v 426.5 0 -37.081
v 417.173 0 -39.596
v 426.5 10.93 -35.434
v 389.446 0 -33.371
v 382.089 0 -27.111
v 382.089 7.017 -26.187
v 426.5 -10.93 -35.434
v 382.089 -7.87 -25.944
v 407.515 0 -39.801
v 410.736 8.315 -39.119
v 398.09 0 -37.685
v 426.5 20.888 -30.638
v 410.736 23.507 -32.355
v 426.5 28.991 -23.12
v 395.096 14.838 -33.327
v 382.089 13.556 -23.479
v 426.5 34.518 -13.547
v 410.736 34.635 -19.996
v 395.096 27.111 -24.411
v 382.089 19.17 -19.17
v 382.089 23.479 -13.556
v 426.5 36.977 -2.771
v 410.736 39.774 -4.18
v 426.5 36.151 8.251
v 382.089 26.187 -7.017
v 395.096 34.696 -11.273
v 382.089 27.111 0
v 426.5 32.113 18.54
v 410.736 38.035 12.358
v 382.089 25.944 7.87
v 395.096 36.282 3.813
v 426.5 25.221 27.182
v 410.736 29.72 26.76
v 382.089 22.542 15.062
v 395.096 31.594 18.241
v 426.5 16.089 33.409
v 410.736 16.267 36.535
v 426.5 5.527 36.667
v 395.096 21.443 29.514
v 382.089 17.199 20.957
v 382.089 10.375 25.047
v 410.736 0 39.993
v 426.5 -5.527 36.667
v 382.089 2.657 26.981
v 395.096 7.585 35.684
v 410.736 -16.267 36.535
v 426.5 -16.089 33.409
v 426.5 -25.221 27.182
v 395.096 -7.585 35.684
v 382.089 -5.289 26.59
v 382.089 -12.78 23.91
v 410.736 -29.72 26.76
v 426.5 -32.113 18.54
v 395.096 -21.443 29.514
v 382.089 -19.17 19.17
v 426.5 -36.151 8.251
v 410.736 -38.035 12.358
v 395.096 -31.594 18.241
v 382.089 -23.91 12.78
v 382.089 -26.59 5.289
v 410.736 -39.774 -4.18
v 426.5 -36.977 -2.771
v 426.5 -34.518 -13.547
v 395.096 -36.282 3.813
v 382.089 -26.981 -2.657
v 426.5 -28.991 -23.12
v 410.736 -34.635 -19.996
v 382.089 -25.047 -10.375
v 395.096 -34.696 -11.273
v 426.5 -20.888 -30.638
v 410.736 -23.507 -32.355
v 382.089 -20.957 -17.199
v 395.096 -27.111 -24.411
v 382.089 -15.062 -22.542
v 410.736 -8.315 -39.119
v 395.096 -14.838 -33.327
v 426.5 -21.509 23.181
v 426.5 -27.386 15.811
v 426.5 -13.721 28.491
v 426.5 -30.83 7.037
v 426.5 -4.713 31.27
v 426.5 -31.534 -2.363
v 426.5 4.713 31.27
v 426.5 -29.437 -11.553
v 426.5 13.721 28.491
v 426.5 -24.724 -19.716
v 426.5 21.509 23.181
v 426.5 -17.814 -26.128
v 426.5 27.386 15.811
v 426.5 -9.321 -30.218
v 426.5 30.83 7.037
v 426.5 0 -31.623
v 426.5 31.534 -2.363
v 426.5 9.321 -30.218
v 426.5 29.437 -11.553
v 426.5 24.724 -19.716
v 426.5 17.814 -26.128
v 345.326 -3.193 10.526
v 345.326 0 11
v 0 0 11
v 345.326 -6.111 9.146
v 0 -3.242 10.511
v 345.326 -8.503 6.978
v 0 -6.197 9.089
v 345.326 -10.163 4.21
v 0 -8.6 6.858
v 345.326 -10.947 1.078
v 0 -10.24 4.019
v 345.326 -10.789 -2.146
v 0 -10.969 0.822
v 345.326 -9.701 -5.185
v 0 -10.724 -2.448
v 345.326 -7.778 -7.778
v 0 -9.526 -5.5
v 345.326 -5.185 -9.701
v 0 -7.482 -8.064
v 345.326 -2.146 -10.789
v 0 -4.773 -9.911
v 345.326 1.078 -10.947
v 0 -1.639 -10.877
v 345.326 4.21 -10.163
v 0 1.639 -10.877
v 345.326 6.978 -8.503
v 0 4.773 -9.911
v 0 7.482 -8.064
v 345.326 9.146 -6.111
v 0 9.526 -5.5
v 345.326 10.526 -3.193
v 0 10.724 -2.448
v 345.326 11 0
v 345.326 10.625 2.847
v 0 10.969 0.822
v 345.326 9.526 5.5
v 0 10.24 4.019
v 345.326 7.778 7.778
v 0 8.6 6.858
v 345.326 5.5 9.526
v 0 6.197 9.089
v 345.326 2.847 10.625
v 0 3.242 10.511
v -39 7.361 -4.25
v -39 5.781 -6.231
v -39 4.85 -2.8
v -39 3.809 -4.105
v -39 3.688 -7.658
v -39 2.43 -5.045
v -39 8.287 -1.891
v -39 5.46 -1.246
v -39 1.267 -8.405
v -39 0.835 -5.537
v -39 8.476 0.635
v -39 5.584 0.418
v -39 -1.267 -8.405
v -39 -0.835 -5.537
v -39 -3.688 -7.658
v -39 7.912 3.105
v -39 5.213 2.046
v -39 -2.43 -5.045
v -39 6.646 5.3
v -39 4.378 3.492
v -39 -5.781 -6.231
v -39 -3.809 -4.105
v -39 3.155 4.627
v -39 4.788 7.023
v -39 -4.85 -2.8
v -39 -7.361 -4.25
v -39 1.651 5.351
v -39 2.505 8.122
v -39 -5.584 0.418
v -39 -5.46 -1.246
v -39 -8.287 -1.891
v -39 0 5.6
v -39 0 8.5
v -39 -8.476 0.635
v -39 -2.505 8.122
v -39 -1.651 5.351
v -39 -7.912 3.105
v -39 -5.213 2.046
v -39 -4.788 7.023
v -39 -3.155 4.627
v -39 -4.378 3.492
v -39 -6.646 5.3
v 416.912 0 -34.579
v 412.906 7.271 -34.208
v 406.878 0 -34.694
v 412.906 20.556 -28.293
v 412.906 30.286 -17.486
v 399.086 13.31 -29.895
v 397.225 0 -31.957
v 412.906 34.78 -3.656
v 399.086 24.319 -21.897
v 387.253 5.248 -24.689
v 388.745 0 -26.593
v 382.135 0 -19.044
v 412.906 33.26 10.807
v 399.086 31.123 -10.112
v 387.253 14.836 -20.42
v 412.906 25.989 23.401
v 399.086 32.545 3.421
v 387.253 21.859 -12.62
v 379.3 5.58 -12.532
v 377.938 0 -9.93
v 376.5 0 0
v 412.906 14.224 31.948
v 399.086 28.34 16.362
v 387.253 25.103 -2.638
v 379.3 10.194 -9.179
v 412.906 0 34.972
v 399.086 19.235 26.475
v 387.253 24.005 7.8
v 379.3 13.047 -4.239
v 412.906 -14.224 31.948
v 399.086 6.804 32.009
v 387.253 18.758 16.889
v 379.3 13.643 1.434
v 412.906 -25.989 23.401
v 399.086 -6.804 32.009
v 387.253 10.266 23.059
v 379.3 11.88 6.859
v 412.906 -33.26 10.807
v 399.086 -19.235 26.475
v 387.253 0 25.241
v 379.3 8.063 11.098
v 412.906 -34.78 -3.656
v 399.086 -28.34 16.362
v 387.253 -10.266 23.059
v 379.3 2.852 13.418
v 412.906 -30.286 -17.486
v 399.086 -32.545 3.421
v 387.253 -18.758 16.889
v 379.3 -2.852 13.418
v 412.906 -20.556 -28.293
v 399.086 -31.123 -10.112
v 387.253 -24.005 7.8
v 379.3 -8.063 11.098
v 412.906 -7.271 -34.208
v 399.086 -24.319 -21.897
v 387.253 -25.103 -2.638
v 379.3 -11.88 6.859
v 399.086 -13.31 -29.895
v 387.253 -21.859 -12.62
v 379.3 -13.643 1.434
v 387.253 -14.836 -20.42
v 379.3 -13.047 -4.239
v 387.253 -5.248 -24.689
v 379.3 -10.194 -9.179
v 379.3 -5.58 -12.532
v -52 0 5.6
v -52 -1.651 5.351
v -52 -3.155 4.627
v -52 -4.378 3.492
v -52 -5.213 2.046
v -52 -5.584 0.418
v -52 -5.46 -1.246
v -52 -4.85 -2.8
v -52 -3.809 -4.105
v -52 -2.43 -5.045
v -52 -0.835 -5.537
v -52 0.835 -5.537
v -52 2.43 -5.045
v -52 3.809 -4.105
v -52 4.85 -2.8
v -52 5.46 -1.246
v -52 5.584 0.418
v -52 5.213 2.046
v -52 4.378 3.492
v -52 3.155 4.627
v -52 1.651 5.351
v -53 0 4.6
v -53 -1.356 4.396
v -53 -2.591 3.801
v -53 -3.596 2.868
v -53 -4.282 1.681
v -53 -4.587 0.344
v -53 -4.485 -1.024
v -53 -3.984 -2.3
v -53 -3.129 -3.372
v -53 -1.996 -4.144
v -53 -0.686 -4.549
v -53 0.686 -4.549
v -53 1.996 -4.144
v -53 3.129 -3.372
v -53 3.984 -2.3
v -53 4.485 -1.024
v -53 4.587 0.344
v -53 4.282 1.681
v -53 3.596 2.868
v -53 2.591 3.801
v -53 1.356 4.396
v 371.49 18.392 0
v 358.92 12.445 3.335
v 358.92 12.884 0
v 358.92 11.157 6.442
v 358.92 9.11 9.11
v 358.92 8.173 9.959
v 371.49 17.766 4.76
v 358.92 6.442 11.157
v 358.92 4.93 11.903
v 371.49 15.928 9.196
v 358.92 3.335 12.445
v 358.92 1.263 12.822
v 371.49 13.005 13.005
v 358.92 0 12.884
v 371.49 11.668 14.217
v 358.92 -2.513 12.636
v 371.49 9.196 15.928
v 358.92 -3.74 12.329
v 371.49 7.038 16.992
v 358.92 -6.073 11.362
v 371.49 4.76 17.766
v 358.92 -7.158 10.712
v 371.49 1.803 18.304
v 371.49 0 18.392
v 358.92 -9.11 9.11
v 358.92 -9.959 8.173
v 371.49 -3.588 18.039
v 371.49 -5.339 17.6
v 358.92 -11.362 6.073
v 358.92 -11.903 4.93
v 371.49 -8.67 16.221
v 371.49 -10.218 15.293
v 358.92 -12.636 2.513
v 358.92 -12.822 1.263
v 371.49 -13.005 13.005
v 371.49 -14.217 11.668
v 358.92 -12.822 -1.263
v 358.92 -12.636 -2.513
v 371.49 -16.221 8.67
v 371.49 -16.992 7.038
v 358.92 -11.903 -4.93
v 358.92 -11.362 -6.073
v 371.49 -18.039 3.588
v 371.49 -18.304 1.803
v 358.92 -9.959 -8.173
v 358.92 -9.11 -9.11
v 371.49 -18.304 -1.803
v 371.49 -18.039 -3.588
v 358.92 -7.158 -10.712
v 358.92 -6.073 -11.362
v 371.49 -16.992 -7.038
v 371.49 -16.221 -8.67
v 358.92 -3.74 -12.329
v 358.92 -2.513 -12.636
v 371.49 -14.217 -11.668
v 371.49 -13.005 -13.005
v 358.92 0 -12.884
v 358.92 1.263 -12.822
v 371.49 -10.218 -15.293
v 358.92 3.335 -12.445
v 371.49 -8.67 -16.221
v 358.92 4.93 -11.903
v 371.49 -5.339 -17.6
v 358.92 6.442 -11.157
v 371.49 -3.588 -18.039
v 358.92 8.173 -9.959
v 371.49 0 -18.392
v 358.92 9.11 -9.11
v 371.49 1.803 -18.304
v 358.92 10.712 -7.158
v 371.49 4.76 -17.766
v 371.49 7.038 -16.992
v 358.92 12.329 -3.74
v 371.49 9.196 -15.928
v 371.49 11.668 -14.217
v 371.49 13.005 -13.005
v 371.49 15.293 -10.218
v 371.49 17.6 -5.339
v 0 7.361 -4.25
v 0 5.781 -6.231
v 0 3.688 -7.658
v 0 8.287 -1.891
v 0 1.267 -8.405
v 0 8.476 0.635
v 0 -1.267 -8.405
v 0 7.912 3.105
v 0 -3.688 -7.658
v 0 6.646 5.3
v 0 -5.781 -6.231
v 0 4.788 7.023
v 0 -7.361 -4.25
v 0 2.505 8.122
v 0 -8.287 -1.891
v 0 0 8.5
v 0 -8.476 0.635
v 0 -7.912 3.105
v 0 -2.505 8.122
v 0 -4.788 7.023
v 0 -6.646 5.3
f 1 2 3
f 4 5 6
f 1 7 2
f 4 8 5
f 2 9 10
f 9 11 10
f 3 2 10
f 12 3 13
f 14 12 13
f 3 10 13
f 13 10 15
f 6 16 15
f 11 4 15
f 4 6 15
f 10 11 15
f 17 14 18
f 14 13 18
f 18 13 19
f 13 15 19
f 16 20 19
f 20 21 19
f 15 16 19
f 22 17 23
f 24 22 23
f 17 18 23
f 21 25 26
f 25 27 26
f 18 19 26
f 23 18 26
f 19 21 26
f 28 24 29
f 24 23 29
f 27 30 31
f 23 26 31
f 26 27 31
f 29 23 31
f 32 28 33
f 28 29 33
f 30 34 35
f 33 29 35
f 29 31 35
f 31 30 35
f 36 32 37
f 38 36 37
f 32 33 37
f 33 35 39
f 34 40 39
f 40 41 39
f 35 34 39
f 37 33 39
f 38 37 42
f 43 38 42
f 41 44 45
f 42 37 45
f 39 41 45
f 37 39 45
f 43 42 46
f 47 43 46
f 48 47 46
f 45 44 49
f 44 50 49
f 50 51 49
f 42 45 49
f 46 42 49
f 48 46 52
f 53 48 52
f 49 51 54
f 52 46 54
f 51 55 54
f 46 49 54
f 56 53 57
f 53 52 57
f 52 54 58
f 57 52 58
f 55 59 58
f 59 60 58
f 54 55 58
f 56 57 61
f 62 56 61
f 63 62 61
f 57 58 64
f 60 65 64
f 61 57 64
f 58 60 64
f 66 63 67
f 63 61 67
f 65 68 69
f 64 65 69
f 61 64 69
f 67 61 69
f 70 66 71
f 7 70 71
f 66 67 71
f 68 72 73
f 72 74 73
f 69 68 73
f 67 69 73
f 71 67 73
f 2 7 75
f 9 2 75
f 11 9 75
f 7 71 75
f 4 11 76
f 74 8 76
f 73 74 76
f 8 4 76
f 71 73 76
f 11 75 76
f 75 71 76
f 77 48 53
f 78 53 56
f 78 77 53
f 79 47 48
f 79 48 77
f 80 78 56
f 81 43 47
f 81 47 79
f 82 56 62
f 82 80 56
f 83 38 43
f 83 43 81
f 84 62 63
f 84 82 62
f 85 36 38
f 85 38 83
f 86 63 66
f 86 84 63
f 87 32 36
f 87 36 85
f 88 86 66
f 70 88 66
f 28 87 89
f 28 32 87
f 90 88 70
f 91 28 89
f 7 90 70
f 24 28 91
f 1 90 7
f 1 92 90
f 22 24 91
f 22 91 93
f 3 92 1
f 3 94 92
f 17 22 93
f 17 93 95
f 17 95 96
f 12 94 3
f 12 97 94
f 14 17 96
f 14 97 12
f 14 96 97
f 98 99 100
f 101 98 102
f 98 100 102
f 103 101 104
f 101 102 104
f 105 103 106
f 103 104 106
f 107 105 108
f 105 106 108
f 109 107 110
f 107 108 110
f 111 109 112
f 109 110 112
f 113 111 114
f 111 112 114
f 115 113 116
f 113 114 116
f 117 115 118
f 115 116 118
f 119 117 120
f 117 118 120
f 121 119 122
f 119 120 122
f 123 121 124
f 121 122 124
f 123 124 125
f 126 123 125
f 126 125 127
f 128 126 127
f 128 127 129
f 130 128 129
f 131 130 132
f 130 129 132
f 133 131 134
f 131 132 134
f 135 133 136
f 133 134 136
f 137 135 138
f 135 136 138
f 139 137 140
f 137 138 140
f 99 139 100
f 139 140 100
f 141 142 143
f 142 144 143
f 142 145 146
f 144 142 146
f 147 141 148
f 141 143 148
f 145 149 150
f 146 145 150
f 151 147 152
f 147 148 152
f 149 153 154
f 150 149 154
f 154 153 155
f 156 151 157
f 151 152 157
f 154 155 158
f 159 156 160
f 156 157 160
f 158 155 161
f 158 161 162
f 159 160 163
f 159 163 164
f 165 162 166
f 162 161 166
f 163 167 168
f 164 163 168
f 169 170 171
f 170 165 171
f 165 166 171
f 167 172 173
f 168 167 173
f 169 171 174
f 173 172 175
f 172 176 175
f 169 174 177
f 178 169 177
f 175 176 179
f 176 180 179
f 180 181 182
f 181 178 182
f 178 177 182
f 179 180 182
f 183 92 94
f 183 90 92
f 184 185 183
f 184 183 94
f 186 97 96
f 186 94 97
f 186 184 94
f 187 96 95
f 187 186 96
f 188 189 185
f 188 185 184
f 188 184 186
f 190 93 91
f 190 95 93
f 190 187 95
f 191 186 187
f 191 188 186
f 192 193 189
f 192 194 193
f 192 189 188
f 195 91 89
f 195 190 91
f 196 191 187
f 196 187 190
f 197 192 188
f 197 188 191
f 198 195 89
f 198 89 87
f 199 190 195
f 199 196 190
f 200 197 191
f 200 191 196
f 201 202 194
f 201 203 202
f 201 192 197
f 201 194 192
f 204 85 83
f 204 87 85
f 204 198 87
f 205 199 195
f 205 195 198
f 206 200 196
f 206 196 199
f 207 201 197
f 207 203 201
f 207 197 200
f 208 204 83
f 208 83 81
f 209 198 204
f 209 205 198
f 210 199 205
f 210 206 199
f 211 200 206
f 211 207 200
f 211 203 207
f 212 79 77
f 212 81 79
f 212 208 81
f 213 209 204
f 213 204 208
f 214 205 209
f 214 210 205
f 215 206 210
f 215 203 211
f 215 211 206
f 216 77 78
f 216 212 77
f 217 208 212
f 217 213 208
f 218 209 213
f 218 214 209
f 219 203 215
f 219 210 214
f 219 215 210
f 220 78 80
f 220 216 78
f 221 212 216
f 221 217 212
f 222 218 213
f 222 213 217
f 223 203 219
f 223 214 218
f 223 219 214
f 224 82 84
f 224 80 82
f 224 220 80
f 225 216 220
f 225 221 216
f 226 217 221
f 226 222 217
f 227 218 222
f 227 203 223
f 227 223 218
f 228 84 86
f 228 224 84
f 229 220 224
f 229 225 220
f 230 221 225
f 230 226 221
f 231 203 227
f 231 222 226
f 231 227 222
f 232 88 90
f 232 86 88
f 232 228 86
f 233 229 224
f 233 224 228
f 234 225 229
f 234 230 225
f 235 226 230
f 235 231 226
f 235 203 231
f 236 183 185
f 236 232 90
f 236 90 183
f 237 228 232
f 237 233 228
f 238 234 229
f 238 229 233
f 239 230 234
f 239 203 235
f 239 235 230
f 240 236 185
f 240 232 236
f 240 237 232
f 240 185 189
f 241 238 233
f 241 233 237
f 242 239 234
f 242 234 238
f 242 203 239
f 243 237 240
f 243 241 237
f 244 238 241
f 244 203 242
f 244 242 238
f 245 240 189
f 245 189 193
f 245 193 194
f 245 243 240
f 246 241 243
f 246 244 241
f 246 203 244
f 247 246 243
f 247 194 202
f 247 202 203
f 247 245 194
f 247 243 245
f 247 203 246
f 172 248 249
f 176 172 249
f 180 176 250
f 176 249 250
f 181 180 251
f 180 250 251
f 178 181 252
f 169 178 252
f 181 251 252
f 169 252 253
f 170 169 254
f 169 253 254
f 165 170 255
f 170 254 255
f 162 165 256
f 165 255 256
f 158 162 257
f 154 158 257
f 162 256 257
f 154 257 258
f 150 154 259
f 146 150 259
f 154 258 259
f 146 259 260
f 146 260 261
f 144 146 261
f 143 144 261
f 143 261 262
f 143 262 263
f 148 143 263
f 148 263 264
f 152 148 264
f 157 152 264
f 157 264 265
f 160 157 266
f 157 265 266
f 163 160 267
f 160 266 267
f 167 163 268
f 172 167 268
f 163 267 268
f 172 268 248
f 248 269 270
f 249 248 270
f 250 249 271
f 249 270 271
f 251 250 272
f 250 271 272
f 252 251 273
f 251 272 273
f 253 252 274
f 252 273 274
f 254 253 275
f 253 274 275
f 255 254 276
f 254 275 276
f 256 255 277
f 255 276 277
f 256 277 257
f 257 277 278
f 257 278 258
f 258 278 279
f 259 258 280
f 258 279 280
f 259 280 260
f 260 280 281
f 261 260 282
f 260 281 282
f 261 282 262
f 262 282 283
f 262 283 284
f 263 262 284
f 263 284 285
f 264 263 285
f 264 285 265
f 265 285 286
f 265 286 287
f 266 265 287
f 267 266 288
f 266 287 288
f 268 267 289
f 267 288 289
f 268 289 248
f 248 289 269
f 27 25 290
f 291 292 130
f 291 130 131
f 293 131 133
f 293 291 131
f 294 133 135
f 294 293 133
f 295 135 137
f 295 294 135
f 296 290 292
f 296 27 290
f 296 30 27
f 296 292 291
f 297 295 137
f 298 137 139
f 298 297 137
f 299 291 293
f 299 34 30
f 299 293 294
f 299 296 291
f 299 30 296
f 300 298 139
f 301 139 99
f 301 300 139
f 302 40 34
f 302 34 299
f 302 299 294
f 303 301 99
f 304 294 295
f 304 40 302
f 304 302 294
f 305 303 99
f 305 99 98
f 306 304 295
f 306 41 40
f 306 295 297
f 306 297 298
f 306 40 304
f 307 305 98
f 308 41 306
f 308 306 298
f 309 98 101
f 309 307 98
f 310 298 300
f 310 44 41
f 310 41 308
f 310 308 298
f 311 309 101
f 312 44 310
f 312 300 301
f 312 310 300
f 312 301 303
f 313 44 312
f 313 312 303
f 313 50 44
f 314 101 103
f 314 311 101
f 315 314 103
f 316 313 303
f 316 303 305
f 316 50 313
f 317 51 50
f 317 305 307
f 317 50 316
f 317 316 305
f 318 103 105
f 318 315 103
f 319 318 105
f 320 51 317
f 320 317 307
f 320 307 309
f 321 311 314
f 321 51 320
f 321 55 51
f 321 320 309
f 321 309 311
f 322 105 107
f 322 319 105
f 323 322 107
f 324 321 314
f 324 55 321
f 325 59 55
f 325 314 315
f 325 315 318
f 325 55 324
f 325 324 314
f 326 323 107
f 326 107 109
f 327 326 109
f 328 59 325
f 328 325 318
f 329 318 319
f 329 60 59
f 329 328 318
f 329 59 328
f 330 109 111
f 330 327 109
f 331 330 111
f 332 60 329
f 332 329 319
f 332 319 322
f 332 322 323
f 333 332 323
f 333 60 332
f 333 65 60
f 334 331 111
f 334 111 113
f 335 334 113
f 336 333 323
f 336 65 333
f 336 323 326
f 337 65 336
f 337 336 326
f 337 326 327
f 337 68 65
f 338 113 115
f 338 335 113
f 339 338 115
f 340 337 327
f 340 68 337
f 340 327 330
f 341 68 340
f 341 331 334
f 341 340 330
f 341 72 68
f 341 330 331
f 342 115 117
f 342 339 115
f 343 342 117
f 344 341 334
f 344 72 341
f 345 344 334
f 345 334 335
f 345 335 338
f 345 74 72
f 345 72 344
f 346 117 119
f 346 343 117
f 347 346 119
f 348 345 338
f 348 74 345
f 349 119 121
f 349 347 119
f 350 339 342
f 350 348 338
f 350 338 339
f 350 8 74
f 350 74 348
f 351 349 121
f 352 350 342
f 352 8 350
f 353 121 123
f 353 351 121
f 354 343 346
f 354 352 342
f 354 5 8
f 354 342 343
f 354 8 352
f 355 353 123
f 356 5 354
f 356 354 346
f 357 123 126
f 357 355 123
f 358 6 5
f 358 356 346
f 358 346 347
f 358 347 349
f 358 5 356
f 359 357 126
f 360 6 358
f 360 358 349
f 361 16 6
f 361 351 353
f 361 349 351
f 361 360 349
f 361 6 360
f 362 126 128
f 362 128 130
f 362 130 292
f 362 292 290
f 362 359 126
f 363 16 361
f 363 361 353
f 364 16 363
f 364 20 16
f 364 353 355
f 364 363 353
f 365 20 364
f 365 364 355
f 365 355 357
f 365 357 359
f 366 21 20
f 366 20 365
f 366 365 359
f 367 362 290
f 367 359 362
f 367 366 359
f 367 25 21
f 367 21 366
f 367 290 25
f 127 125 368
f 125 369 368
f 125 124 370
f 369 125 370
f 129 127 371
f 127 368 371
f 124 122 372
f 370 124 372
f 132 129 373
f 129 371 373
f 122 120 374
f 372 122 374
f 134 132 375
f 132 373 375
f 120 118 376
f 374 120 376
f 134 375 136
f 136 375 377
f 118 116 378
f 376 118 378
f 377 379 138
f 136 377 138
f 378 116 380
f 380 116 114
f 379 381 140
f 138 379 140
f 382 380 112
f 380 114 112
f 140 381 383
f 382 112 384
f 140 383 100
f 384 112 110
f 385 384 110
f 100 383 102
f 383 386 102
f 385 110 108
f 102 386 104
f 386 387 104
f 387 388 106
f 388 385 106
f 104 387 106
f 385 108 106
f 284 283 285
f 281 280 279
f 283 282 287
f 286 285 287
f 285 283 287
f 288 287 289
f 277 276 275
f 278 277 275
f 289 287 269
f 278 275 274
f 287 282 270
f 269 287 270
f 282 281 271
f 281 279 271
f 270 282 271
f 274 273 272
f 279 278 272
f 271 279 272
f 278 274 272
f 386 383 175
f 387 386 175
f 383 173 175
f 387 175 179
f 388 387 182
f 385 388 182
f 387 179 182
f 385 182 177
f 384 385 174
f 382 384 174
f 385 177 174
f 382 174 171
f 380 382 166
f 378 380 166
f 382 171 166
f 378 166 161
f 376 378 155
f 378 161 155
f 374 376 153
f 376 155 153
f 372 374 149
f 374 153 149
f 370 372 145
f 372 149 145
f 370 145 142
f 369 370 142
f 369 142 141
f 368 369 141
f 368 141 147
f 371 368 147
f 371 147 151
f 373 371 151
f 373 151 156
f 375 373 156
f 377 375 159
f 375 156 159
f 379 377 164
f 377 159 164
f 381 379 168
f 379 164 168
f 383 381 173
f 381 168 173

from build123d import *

# Parameters (mm, degrees)
CHAMFER1_SIZE = 1


with BuildPart() as part:
    # Sketch1 → Revolve1 (revolve)
    with BuildSketch(Plane.XY, mode=Mode.PRIVATE) as revolve1_sk:
        Polygon((-39, 8.5), (-39, 5.6), (-53, 5.6), (-53, 0), (411.5, 0), (411.5, 11), (0, 11), (0, 8.5), align=None)
    revolve(revolve1_sk.sketch.rotate(Axis((-53, 0, 0), (1, 0, 0)), 90), axis=Axis((-53, 0, 0), (1, 0, 0)))

    # Chamfer1
    chamfer1_edges = [part.edges().sort_by_distance(p)[0] for p in [
        (-53, 0, -5.6),
    ]]
    chamfer(chamfer1_edges, length=CHAMFER1_SIZE)

    # Sketch2 → Revolve2 (revolve)
    with BuildSketch(Plane(origin=(0, 0, 0), x_dir=(1, 0, 0), z_dir=(0, 1, 0))):
        with BuildLine():
            Line((371.5, 0), (451.5, 0))
            ThreePointArc((451.5, 0), (411.5, 40), (371.5, 0))
        make_face()
    revolve(axis=Axis((371.5, 0, 0), (1, 0, 0)))

    # Fillet1: read off the stored shape, not the designer's step
    # Fillet1 outline → Fillet1 (revolve)
    with BuildSketch(Plane.YX):
        with BuildLine():
            ThreePointArc((11, 345.325986974), (15.20456112, 365.395311272), (27.111111111, 382.089327544))
            Line((27.111111111, 382.089327544), (11, 382.089327544))
            Line((11, 382.089327544), (11, 345.325986974))
        make_face()
    revolve(axis=Axis((0, 0, 0), (1, 0, 0)))

    # Sketch3 → Cut-Revolve1 (revolve, cut)
    with BuildSketch(Plane(origin=(0, 0, 0), x_dir=(1, 0, 0), z_dir=(0, 1, 0))):
        with BuildLine():
            Line((426.5, 0), (451.5, 0))
            ThreePointArc((451.5, 0), (444.666247904, 22.360679775), (426.5, 37.080992435))
            Line((426.5, 37.080992435), (426.5, 0))
        make_face()
    revolve(axis=Axis((426.5, 0, 0), (1, 0, 0)), mode=Mode.SUBTRACT)

    # Sketch4 → Cut-Revolve2 (revolve, cut)
    with BuildSketch(Plane(origin=(0, 0, 0), x_dir=(1, 0, 0), z_dir=(0, 1, 0))):
        with BuildLine():
            Line((376.5, 0), (446.5, 0))
            ThreePointArc((446.5, 0), (411.5, 35), (376.5, 0))
        make_face()
    revolve(axis=Axis((376.5, 0, 0), (1, 0, 0)), mode=Mode.SUBTRACT)


solid = part.part
